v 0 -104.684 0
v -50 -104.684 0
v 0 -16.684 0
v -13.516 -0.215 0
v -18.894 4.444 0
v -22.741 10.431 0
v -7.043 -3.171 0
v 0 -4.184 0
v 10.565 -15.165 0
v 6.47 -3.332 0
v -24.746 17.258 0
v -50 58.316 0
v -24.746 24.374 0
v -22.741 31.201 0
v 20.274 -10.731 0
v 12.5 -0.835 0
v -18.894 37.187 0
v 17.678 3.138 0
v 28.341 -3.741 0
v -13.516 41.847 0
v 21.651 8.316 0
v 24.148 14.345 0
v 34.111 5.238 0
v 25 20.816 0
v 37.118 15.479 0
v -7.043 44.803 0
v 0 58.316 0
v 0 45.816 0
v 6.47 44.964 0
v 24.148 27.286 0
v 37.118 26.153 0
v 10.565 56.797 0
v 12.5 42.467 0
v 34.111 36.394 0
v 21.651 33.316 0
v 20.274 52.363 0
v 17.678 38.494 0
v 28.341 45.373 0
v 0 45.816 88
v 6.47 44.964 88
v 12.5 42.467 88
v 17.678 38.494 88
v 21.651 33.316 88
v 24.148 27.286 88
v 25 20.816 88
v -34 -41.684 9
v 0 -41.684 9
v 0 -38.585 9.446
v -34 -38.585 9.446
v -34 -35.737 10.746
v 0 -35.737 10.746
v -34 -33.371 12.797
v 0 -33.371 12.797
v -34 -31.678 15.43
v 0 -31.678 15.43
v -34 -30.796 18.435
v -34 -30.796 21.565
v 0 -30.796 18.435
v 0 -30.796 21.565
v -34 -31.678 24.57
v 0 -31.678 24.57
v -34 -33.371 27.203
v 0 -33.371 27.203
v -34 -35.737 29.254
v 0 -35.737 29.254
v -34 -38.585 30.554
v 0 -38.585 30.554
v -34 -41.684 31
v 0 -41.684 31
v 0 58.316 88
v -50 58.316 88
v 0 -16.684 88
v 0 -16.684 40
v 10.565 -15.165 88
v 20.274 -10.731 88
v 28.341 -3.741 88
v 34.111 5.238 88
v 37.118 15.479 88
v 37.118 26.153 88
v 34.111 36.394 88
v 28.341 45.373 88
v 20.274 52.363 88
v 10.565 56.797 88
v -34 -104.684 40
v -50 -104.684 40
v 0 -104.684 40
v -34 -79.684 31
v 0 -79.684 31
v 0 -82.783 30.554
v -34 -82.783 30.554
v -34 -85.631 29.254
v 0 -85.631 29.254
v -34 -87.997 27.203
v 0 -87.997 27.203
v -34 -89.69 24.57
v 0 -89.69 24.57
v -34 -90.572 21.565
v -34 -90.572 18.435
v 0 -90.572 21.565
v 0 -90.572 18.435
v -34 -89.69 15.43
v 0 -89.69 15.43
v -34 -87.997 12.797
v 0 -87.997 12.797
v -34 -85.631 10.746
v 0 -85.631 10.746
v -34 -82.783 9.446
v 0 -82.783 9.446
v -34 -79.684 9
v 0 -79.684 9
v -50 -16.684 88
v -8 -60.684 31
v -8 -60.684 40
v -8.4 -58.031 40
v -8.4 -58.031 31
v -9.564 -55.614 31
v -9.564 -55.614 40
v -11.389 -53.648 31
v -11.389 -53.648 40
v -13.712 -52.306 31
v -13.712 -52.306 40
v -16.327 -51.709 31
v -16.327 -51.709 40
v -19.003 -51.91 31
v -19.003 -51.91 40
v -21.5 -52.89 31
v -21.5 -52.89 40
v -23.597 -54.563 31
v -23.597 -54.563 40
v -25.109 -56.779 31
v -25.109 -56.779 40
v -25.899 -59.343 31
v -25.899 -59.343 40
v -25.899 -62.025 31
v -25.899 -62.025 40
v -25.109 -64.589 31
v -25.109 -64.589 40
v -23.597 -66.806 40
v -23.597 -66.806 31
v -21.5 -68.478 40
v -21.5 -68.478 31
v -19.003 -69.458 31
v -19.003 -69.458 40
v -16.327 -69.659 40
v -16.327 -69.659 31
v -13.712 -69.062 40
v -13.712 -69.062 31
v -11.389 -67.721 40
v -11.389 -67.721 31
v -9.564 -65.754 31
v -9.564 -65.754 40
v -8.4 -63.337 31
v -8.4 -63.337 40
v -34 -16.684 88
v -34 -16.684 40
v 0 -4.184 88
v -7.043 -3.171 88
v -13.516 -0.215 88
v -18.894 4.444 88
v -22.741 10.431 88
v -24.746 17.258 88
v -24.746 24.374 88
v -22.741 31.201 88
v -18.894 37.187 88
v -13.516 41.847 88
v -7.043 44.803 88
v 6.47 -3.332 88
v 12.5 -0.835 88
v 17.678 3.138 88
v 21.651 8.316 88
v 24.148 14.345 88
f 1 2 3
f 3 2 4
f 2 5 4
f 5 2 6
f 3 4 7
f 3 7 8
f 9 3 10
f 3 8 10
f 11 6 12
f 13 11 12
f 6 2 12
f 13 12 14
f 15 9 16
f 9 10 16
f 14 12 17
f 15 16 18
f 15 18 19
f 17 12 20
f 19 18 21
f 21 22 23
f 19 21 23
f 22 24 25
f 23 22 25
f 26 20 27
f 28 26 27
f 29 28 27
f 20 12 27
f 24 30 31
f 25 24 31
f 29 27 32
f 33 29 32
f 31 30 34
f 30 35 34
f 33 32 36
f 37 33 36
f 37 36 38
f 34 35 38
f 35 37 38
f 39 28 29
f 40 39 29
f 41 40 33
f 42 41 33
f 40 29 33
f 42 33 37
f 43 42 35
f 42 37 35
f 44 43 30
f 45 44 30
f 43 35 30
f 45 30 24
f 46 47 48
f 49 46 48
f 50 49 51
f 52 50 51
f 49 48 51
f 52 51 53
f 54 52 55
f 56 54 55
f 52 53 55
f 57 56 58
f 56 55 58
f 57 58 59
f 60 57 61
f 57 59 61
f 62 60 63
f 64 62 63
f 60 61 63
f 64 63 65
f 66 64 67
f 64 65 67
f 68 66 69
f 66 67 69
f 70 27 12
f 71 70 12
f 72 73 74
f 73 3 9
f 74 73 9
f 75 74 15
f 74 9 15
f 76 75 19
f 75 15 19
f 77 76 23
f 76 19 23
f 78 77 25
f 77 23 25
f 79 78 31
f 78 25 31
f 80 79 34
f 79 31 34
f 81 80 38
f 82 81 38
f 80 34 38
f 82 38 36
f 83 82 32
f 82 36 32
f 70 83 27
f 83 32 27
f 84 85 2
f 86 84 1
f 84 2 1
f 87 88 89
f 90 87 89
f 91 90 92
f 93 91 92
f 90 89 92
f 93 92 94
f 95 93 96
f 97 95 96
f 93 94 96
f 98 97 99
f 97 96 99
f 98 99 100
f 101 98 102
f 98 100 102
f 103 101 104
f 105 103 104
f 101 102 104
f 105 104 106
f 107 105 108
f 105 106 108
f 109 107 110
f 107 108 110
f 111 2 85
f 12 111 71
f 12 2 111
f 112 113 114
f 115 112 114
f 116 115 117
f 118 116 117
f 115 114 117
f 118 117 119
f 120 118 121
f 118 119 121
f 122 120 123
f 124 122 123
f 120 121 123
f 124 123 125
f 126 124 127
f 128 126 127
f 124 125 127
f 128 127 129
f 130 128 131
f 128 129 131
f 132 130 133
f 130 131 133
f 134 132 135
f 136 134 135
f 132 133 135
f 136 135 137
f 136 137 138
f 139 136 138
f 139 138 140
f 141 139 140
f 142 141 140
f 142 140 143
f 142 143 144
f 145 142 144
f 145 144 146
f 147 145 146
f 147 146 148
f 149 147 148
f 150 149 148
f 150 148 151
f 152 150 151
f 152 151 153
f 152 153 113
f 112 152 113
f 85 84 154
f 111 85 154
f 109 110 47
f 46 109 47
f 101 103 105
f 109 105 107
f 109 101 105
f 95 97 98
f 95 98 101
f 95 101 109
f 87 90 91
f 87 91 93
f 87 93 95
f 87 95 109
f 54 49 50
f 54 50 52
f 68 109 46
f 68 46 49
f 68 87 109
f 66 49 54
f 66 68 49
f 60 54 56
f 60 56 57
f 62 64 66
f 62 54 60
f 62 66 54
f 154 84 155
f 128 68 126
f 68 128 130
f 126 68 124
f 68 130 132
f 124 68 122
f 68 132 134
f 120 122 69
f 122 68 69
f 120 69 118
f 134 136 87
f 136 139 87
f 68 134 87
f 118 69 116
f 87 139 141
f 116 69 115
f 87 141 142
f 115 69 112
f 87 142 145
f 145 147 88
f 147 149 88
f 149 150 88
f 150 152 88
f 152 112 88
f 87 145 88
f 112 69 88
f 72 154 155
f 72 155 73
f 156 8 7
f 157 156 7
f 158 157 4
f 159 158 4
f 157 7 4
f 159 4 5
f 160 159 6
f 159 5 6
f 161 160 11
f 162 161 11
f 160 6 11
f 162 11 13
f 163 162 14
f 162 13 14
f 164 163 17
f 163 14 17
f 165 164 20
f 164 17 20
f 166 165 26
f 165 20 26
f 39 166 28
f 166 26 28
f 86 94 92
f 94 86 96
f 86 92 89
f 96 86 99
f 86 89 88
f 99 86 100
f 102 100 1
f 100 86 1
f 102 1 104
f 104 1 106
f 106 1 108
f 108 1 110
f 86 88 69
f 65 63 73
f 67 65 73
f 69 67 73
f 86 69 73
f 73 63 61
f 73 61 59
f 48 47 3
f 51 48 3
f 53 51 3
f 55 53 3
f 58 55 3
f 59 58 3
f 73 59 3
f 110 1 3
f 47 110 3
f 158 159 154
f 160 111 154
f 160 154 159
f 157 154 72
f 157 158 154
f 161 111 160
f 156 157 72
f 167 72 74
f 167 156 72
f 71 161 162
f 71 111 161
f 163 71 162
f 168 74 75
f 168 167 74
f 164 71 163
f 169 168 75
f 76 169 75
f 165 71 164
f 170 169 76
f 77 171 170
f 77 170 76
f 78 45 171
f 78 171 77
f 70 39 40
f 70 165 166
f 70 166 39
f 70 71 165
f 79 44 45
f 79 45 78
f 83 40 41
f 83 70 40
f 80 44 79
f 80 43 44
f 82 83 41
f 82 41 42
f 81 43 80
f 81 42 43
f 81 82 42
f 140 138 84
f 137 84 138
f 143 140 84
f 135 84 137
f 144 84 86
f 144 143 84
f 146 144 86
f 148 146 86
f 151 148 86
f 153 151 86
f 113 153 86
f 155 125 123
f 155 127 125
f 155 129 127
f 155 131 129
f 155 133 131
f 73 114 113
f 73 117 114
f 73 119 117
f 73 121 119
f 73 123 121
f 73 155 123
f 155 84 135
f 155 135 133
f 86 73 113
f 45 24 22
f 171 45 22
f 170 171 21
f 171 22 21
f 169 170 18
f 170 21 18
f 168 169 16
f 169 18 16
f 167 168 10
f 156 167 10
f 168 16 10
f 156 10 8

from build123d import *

# Parameters (mm, degrees)
F0_W      = 50
F0_H      = 88
F1_DEPTH  = 88
F2_W      = 50
F2_H      = 88
F3_DEPTH  = 48
F4_W      = 16
F4_H      = 88
F5_DEPTH  = 48
F7_DEPTH  = 25
F8_R      = 9
F9_DEPTH  = 31
F11_DEPTH = 34


with BuildPart() as f1:
    # F0 (on Top) → F1 (new body)
    with BuildSketch(Plane.XY):
        with Locations((-25, -60.6841130704)):
            Rectangle(F0_W, F0_H)
        with BuildLine():
            Line((0, 58.3158869296), (-50, 58.3158869296))
            Line((-50, 58.3158869296), (-50, -16.6841130704))
            Line((-50, -16.6841130704), (0, -16.6841130704))
            Line((0, -16.6841130704), (0, -4.1841130704))
            ThreePointArc((0, -4.1841130704), (-25, 20.8158869296), (0, 45.8158869296))
            Line((0, 45.8158869296), (0, 58.3158869296))
        make_face()
        with BuildLine():
            ThreePointArc((0, -16.6841130704), (37.5, 20.8158869296), (0, 58.3158869296))
            Line((0, 58.3158869296), (0, 45.8158869296))
            ThreePointArc((0, 45.8158869296), (17.6776695297, 38.4935564593), (25, 20.8158869296))
            ThreePointArc((25, 20.8158869296), (17.6776695297, 3.1382174), (0, -4.1841130704))
            Line((0, -4.1841130704), (0, -16.6841130704))
        make_face()
    extrude(amount=F1_DEPTH)

    # F2 (on face) → F3 (cut)
    with BuildSketch(Plane.XY.offset(88)):
        with Locations((-25, -60.6841130704)):
            Rectangle(F2_W, F2_H)
    extrude(amount=-F3_DEPTH, mode=Mode.SUBTRACT)

    # F4 (on face) → F5 (join)
    with BuildSketch(Plane.XY.offset(40)):
        with Locations((-42, -60.6841130704)):
            Rectangle(F4_W, F4_H)
    extrude(amount=F5_DEPTH)

    # F6 (on face) → F7 (cut)
    with BuildSketch(Plane.YZ.offset(-34)):
        Polygon((-104.6841130704, 88), (-104.6841130704, 40), (-16.6841130704, 88), align=None)
    extrude(amount=-F7_DEPTH, mode=Mode.SUBTRACT)

    # F8 (on face) → F9 (cut)
    with BuildSketch(Plane.XY.offset(40)):
        with Locations((-17, -60.6841130704)):
            Circle(F8_R)
    extrude(amount=-F9_DEPTH, mode=Mode.SUBTRACT)

    # F10 (on face) → F11 (cut)
    with BuildSketch(Plane.YZ):
        with BuildLine():
            Line((-41.6841130704, 31), (-79.6841130704, 31))
            ThreePointArc((-79.6841130704, 31), (-90.6841130704, 20), (-79.6841130704, 9))
            Line((-79.6841130704, 9), (-41.6841130704, 9))
            ThreePointArc((-41.6841130704, 9), (-30.6841130704, 20), (-41.6841130704, 31))
        make_face()
    extrude(amount=-F11_DEPTH, mode=Mode.SUBTRACT)


solid = f1.part
